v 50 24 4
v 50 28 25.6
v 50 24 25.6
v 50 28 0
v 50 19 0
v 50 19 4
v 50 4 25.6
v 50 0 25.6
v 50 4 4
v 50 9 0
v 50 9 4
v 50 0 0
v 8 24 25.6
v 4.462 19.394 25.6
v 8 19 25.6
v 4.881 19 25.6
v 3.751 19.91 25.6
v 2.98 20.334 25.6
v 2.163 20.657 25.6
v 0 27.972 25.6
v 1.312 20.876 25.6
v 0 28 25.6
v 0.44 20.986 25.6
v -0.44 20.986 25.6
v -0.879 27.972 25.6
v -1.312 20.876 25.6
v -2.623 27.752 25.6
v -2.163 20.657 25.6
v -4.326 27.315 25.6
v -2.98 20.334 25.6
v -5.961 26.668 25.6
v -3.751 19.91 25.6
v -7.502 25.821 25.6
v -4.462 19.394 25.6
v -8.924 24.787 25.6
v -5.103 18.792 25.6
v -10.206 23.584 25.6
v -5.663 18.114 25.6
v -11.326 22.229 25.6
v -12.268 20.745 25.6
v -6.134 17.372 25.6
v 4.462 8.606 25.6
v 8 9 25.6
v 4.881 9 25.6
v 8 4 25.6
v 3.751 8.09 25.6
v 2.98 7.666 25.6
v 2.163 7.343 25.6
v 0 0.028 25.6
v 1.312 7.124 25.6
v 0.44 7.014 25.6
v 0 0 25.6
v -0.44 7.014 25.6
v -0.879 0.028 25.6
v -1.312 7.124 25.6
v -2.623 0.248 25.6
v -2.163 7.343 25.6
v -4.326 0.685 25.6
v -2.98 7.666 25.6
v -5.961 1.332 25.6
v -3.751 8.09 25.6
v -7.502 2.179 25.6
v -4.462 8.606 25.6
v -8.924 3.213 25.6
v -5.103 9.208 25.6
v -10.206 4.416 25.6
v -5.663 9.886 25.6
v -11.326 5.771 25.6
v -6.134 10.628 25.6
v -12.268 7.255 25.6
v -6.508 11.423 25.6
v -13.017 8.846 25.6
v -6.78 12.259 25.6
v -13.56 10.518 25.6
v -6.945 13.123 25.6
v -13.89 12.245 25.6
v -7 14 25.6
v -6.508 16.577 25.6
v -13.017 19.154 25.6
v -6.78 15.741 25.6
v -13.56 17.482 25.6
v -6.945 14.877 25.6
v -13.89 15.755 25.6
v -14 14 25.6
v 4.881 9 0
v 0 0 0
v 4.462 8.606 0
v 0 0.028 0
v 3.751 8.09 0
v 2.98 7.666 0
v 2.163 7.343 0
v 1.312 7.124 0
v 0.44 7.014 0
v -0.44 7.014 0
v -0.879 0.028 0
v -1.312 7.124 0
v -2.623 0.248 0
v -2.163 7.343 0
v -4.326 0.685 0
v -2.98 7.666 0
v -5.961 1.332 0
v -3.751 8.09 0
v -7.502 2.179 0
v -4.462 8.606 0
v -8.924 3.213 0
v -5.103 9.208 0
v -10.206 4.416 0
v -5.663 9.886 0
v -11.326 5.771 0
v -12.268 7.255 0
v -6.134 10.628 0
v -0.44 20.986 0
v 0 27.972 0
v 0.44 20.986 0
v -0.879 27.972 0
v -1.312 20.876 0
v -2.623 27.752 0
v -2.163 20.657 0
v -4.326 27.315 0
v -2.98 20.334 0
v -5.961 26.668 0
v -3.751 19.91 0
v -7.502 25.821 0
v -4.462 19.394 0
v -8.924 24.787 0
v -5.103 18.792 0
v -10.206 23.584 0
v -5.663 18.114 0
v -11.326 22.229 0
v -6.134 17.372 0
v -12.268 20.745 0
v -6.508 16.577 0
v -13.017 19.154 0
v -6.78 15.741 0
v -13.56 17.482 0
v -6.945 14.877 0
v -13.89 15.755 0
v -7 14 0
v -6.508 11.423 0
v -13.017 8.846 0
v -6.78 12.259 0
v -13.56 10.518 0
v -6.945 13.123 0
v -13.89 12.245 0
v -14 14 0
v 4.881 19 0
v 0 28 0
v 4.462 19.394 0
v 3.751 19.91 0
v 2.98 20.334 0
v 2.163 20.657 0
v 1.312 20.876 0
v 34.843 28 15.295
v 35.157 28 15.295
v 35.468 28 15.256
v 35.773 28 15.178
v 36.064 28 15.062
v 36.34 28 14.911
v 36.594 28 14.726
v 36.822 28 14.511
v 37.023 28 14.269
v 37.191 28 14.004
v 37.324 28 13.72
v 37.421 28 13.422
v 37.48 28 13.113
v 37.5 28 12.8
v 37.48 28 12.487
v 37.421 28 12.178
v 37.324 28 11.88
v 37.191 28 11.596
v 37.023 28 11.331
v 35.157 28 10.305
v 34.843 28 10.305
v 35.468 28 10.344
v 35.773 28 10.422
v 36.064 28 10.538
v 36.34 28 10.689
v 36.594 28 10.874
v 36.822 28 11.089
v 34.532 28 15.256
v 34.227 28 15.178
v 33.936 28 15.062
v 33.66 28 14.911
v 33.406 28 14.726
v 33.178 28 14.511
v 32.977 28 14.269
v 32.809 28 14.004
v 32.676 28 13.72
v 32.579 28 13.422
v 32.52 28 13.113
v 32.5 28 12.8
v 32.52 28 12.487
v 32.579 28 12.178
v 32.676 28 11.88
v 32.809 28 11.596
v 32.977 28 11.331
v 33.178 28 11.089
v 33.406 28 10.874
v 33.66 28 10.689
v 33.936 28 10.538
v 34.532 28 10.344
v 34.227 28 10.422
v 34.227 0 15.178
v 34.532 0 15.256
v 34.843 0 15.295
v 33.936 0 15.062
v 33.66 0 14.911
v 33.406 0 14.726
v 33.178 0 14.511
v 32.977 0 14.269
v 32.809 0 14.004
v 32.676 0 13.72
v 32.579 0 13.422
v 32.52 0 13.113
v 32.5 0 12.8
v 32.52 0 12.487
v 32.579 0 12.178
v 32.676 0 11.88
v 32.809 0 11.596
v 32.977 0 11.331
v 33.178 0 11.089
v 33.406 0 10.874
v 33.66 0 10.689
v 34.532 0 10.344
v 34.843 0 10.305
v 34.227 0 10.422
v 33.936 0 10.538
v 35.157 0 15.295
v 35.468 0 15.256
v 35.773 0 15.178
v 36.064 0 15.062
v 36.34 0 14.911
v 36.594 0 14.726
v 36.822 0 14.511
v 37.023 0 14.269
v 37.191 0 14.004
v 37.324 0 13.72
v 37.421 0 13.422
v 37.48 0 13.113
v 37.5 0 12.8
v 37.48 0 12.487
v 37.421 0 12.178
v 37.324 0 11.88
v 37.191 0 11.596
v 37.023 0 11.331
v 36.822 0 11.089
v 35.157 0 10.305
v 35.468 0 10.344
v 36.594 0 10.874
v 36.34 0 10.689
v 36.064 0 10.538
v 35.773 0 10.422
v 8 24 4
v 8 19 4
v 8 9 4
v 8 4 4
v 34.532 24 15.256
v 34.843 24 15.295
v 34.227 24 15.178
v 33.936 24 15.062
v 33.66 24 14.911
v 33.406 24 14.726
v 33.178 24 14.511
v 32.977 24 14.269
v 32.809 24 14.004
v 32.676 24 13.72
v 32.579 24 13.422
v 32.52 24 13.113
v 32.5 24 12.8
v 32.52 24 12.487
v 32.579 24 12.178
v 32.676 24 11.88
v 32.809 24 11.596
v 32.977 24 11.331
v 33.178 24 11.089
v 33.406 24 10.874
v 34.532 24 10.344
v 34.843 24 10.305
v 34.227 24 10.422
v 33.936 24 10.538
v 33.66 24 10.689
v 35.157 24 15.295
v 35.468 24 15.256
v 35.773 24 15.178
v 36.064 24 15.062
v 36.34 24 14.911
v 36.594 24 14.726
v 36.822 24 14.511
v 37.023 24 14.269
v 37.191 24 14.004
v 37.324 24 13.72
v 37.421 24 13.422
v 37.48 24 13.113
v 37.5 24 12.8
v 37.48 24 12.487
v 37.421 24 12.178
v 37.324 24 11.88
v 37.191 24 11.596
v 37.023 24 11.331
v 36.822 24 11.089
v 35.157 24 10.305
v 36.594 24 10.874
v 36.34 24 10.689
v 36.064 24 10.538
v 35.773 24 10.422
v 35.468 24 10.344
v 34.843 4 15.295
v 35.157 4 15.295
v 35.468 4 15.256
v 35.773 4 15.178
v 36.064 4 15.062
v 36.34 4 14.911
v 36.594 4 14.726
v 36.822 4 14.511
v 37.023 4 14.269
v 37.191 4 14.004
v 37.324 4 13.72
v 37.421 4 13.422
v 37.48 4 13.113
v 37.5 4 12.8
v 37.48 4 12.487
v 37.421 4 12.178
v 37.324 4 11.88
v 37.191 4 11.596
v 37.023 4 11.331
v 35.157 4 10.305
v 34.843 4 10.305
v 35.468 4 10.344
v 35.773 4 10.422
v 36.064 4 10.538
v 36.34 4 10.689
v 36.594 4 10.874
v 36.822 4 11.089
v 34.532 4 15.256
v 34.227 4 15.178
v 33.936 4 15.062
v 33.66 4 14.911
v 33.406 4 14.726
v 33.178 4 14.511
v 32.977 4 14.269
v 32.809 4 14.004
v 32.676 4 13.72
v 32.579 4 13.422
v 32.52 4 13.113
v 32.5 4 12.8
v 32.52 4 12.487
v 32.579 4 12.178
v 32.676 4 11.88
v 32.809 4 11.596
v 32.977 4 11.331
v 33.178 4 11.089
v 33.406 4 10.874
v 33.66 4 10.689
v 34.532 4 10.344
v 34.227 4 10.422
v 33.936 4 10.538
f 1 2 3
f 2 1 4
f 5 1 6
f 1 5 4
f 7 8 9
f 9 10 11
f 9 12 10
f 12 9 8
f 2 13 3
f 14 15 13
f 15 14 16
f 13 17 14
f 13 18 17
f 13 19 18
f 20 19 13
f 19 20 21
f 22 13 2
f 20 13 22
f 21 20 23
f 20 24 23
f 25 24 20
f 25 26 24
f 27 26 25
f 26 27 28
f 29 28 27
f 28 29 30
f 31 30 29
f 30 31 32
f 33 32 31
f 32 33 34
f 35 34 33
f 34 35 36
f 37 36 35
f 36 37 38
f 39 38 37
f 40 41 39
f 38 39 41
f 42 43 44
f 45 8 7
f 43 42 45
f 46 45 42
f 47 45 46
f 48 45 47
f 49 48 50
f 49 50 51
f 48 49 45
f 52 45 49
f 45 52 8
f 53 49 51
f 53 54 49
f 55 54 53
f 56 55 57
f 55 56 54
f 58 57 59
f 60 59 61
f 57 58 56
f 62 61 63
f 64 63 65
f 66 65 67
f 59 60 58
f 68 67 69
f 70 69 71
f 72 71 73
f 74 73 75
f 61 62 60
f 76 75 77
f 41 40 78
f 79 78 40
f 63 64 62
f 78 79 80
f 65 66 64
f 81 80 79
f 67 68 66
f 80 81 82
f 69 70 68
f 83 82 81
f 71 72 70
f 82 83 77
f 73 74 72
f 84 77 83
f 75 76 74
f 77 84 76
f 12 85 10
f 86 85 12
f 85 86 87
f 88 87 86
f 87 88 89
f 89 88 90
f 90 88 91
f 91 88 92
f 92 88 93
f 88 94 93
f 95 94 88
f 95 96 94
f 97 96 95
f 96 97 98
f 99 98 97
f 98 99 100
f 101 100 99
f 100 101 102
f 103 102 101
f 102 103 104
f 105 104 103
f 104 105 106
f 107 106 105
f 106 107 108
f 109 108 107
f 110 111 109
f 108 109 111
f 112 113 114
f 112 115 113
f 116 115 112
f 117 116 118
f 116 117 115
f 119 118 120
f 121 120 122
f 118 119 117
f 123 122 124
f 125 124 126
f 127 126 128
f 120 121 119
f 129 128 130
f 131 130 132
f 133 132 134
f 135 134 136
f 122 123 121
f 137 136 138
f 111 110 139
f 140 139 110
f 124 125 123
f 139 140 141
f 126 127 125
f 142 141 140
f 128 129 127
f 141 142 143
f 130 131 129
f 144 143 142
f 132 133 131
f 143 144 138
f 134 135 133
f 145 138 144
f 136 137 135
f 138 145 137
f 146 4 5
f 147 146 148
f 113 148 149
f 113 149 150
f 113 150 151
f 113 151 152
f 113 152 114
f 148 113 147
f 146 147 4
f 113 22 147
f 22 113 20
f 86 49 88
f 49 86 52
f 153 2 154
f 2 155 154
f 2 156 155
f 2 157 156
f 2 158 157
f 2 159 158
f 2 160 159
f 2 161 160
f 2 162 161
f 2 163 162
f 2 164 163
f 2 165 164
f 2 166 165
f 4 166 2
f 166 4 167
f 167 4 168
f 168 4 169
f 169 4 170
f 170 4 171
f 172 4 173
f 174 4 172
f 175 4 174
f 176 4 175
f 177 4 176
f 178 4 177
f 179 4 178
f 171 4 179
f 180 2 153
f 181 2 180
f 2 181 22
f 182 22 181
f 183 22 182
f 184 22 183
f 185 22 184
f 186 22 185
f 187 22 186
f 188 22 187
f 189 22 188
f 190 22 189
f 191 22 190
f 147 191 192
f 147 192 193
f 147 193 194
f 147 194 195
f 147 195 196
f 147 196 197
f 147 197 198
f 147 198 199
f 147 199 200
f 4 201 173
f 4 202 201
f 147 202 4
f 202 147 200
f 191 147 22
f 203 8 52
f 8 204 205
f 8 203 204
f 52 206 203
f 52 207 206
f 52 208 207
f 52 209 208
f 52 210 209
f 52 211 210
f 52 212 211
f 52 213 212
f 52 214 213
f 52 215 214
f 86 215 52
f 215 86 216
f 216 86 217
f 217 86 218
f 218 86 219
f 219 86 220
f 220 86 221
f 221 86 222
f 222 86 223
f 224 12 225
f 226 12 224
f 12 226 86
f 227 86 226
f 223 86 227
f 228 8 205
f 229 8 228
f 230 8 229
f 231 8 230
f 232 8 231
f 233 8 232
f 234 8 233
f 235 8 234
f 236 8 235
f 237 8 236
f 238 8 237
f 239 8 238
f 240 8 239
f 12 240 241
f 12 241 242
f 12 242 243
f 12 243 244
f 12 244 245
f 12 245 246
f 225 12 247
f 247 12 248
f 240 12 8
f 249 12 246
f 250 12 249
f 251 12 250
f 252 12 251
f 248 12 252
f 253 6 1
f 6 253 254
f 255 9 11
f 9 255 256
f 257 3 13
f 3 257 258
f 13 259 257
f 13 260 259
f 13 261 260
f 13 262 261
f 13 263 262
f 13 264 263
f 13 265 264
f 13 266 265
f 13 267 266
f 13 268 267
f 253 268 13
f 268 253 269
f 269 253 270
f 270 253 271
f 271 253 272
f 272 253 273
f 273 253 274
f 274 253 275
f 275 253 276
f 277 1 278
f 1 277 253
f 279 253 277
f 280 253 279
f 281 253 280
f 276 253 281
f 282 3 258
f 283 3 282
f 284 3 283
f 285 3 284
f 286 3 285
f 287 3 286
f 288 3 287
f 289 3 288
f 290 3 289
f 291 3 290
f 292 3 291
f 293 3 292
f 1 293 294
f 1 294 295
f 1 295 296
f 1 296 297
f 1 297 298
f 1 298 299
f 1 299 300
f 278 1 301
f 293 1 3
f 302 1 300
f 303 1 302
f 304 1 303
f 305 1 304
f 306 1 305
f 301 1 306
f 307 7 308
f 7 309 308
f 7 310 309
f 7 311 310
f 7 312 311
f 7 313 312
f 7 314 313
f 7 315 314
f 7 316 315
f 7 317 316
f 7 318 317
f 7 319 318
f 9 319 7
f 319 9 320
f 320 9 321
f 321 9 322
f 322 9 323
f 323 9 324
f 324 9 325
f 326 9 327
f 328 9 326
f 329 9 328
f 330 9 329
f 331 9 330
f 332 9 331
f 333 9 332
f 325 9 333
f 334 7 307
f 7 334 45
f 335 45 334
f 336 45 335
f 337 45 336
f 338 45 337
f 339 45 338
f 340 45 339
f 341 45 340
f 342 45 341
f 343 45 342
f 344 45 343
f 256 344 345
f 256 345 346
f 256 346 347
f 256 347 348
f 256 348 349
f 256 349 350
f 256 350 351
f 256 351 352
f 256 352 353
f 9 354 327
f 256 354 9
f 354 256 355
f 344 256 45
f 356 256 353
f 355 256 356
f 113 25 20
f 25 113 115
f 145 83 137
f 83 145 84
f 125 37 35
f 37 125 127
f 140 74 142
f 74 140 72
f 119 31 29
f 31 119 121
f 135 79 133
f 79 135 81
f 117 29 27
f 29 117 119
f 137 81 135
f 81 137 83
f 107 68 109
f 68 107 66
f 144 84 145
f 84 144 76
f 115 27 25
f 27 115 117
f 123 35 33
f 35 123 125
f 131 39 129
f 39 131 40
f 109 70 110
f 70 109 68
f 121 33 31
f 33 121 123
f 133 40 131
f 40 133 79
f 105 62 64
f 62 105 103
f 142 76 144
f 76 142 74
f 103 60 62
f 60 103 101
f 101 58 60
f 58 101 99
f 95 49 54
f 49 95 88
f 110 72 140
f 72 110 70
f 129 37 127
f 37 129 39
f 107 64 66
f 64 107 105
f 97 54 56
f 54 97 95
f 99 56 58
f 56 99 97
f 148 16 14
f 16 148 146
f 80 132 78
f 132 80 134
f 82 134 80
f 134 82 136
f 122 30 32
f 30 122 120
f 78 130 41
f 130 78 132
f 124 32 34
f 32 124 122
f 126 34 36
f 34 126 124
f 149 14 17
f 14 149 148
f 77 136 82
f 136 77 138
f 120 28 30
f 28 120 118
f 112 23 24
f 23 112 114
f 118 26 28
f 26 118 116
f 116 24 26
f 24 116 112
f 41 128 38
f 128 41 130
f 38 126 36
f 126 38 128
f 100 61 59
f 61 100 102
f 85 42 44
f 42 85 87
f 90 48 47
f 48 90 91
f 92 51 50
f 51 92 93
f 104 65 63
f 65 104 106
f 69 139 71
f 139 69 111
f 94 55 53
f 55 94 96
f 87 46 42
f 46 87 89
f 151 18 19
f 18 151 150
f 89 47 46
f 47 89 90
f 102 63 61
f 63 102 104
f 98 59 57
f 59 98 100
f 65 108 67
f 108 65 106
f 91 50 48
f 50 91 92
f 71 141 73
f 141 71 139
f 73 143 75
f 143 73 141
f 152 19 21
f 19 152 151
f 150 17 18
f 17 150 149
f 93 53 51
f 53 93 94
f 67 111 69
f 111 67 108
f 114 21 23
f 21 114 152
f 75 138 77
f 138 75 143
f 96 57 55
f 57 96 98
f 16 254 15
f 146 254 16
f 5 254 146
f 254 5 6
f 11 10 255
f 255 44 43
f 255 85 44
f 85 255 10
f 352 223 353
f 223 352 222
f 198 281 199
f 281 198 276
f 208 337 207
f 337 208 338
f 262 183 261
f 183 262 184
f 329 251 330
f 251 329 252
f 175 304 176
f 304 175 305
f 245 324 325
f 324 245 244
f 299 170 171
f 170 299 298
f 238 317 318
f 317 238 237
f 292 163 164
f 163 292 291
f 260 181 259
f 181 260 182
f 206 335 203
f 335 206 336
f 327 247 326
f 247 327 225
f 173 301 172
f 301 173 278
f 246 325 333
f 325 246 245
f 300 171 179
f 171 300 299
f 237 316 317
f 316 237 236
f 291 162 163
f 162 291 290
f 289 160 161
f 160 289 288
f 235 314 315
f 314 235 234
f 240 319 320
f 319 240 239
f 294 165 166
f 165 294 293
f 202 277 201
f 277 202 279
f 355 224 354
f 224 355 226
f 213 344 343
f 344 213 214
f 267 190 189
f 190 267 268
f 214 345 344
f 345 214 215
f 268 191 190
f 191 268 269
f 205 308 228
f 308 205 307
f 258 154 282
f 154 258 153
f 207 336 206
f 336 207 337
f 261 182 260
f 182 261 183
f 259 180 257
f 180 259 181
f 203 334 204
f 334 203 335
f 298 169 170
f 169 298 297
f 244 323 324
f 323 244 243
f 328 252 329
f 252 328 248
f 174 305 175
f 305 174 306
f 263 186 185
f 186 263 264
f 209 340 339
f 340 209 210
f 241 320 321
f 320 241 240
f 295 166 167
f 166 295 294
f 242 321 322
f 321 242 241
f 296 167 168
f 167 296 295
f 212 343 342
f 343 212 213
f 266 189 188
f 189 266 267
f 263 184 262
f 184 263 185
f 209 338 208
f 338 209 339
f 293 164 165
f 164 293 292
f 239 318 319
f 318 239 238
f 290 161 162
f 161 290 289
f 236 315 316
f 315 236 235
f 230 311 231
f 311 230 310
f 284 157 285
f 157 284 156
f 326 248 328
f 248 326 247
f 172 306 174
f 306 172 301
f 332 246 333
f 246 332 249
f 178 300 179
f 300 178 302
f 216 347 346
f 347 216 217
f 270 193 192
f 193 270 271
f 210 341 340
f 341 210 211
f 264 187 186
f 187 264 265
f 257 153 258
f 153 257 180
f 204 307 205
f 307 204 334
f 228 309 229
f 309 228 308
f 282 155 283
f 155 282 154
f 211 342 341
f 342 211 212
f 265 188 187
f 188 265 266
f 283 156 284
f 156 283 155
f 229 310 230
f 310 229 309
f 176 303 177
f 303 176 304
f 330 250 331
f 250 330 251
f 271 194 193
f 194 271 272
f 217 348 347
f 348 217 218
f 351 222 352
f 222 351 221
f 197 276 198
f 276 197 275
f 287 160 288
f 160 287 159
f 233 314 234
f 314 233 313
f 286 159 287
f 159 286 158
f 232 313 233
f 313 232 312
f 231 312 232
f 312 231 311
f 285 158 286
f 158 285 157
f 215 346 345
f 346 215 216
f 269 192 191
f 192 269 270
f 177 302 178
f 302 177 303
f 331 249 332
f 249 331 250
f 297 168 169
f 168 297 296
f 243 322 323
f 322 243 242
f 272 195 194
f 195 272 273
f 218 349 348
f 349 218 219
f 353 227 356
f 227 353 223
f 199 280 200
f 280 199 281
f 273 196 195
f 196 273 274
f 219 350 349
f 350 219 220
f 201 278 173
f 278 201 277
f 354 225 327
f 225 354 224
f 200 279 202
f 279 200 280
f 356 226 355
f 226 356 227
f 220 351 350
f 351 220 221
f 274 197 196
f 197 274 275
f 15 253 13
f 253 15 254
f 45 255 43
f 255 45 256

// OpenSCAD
POLE_DIAMETER = 14;
FENCE_HEIGHT=21.6;
FENCE_DEPTH=20;
FENCE_LENGTH = 50; //open ended
WALL_THICKNESS = 4;

TOTAL_HEIGHT = FENCE_HEIGHT + WALL_THICKNESS;
TOTAL_DEPTH = FENCE_DEPTH+2*WALL_THICKNESS;

CUT_DEPTH = 10;

$fn=50;


module fence_section() {
    difference() {
        cube([FENCE_LENGTH, TOTAL_DEPTH, TOTAL_HEIGHT]);
        translate([WALL_THICKNESS, WALL_THICKNESS, WALL_THICKNESS]){
            cube([FENCE_LENGTH - WALL_THICKNESS, FENCE_DEPTH, FENCE_HEIGHT]);
        }
    }
}

//fence_section();

module pole_section() {
    difference() {
        cylinder(h=TOTAL_HEIGHT, r=TOTAL_DEPTH/2);
        color("blue") cylinder(h=TOTAL_HEIGHT, r=POLE_DIAMETER/2, center=false);
    }

}


difference() {
    union() {
        fence_section();
        translate([0, TOTAL_DEPTH/2, 0]) {
            pole_section();
        }
    }
    // delete pole 2nd time so it passes through fence section
    translate([0, TOTAL_DEPTH/2, 0]) {
        color("blue") cylinder(h=TOTAL_HEIGHT, r=POLE_DIAMETER/2, center=false);
    }
    translate([0, TOTAL_DEPTH/2 - CUT_DEPTH/2, 0]) {
        color("pink") cube([FENCE_LENGTH, CUT_DEPTH, TOTAL_HEIGHT]);
    }
    color("green") translate([FENCE_LENGTH-15, TOTAL_DEPTH, TOTAL_HEIGHT/2]) rotate([90, 0, 0]) cylinder(h=TOTAL_DEPTH, r=2.5, center=false);
    // delete interior fence section 2nd time so part is more flexible
    translate([WALL_THICKNESS*2, WALL_THICKNESS, WALL_THICKNESS]){
        cube([FENCE_LENGTH - WALL_THICKNESS, FENCE_DEPTH, FENCE_HEIGHT]);
    }
}
